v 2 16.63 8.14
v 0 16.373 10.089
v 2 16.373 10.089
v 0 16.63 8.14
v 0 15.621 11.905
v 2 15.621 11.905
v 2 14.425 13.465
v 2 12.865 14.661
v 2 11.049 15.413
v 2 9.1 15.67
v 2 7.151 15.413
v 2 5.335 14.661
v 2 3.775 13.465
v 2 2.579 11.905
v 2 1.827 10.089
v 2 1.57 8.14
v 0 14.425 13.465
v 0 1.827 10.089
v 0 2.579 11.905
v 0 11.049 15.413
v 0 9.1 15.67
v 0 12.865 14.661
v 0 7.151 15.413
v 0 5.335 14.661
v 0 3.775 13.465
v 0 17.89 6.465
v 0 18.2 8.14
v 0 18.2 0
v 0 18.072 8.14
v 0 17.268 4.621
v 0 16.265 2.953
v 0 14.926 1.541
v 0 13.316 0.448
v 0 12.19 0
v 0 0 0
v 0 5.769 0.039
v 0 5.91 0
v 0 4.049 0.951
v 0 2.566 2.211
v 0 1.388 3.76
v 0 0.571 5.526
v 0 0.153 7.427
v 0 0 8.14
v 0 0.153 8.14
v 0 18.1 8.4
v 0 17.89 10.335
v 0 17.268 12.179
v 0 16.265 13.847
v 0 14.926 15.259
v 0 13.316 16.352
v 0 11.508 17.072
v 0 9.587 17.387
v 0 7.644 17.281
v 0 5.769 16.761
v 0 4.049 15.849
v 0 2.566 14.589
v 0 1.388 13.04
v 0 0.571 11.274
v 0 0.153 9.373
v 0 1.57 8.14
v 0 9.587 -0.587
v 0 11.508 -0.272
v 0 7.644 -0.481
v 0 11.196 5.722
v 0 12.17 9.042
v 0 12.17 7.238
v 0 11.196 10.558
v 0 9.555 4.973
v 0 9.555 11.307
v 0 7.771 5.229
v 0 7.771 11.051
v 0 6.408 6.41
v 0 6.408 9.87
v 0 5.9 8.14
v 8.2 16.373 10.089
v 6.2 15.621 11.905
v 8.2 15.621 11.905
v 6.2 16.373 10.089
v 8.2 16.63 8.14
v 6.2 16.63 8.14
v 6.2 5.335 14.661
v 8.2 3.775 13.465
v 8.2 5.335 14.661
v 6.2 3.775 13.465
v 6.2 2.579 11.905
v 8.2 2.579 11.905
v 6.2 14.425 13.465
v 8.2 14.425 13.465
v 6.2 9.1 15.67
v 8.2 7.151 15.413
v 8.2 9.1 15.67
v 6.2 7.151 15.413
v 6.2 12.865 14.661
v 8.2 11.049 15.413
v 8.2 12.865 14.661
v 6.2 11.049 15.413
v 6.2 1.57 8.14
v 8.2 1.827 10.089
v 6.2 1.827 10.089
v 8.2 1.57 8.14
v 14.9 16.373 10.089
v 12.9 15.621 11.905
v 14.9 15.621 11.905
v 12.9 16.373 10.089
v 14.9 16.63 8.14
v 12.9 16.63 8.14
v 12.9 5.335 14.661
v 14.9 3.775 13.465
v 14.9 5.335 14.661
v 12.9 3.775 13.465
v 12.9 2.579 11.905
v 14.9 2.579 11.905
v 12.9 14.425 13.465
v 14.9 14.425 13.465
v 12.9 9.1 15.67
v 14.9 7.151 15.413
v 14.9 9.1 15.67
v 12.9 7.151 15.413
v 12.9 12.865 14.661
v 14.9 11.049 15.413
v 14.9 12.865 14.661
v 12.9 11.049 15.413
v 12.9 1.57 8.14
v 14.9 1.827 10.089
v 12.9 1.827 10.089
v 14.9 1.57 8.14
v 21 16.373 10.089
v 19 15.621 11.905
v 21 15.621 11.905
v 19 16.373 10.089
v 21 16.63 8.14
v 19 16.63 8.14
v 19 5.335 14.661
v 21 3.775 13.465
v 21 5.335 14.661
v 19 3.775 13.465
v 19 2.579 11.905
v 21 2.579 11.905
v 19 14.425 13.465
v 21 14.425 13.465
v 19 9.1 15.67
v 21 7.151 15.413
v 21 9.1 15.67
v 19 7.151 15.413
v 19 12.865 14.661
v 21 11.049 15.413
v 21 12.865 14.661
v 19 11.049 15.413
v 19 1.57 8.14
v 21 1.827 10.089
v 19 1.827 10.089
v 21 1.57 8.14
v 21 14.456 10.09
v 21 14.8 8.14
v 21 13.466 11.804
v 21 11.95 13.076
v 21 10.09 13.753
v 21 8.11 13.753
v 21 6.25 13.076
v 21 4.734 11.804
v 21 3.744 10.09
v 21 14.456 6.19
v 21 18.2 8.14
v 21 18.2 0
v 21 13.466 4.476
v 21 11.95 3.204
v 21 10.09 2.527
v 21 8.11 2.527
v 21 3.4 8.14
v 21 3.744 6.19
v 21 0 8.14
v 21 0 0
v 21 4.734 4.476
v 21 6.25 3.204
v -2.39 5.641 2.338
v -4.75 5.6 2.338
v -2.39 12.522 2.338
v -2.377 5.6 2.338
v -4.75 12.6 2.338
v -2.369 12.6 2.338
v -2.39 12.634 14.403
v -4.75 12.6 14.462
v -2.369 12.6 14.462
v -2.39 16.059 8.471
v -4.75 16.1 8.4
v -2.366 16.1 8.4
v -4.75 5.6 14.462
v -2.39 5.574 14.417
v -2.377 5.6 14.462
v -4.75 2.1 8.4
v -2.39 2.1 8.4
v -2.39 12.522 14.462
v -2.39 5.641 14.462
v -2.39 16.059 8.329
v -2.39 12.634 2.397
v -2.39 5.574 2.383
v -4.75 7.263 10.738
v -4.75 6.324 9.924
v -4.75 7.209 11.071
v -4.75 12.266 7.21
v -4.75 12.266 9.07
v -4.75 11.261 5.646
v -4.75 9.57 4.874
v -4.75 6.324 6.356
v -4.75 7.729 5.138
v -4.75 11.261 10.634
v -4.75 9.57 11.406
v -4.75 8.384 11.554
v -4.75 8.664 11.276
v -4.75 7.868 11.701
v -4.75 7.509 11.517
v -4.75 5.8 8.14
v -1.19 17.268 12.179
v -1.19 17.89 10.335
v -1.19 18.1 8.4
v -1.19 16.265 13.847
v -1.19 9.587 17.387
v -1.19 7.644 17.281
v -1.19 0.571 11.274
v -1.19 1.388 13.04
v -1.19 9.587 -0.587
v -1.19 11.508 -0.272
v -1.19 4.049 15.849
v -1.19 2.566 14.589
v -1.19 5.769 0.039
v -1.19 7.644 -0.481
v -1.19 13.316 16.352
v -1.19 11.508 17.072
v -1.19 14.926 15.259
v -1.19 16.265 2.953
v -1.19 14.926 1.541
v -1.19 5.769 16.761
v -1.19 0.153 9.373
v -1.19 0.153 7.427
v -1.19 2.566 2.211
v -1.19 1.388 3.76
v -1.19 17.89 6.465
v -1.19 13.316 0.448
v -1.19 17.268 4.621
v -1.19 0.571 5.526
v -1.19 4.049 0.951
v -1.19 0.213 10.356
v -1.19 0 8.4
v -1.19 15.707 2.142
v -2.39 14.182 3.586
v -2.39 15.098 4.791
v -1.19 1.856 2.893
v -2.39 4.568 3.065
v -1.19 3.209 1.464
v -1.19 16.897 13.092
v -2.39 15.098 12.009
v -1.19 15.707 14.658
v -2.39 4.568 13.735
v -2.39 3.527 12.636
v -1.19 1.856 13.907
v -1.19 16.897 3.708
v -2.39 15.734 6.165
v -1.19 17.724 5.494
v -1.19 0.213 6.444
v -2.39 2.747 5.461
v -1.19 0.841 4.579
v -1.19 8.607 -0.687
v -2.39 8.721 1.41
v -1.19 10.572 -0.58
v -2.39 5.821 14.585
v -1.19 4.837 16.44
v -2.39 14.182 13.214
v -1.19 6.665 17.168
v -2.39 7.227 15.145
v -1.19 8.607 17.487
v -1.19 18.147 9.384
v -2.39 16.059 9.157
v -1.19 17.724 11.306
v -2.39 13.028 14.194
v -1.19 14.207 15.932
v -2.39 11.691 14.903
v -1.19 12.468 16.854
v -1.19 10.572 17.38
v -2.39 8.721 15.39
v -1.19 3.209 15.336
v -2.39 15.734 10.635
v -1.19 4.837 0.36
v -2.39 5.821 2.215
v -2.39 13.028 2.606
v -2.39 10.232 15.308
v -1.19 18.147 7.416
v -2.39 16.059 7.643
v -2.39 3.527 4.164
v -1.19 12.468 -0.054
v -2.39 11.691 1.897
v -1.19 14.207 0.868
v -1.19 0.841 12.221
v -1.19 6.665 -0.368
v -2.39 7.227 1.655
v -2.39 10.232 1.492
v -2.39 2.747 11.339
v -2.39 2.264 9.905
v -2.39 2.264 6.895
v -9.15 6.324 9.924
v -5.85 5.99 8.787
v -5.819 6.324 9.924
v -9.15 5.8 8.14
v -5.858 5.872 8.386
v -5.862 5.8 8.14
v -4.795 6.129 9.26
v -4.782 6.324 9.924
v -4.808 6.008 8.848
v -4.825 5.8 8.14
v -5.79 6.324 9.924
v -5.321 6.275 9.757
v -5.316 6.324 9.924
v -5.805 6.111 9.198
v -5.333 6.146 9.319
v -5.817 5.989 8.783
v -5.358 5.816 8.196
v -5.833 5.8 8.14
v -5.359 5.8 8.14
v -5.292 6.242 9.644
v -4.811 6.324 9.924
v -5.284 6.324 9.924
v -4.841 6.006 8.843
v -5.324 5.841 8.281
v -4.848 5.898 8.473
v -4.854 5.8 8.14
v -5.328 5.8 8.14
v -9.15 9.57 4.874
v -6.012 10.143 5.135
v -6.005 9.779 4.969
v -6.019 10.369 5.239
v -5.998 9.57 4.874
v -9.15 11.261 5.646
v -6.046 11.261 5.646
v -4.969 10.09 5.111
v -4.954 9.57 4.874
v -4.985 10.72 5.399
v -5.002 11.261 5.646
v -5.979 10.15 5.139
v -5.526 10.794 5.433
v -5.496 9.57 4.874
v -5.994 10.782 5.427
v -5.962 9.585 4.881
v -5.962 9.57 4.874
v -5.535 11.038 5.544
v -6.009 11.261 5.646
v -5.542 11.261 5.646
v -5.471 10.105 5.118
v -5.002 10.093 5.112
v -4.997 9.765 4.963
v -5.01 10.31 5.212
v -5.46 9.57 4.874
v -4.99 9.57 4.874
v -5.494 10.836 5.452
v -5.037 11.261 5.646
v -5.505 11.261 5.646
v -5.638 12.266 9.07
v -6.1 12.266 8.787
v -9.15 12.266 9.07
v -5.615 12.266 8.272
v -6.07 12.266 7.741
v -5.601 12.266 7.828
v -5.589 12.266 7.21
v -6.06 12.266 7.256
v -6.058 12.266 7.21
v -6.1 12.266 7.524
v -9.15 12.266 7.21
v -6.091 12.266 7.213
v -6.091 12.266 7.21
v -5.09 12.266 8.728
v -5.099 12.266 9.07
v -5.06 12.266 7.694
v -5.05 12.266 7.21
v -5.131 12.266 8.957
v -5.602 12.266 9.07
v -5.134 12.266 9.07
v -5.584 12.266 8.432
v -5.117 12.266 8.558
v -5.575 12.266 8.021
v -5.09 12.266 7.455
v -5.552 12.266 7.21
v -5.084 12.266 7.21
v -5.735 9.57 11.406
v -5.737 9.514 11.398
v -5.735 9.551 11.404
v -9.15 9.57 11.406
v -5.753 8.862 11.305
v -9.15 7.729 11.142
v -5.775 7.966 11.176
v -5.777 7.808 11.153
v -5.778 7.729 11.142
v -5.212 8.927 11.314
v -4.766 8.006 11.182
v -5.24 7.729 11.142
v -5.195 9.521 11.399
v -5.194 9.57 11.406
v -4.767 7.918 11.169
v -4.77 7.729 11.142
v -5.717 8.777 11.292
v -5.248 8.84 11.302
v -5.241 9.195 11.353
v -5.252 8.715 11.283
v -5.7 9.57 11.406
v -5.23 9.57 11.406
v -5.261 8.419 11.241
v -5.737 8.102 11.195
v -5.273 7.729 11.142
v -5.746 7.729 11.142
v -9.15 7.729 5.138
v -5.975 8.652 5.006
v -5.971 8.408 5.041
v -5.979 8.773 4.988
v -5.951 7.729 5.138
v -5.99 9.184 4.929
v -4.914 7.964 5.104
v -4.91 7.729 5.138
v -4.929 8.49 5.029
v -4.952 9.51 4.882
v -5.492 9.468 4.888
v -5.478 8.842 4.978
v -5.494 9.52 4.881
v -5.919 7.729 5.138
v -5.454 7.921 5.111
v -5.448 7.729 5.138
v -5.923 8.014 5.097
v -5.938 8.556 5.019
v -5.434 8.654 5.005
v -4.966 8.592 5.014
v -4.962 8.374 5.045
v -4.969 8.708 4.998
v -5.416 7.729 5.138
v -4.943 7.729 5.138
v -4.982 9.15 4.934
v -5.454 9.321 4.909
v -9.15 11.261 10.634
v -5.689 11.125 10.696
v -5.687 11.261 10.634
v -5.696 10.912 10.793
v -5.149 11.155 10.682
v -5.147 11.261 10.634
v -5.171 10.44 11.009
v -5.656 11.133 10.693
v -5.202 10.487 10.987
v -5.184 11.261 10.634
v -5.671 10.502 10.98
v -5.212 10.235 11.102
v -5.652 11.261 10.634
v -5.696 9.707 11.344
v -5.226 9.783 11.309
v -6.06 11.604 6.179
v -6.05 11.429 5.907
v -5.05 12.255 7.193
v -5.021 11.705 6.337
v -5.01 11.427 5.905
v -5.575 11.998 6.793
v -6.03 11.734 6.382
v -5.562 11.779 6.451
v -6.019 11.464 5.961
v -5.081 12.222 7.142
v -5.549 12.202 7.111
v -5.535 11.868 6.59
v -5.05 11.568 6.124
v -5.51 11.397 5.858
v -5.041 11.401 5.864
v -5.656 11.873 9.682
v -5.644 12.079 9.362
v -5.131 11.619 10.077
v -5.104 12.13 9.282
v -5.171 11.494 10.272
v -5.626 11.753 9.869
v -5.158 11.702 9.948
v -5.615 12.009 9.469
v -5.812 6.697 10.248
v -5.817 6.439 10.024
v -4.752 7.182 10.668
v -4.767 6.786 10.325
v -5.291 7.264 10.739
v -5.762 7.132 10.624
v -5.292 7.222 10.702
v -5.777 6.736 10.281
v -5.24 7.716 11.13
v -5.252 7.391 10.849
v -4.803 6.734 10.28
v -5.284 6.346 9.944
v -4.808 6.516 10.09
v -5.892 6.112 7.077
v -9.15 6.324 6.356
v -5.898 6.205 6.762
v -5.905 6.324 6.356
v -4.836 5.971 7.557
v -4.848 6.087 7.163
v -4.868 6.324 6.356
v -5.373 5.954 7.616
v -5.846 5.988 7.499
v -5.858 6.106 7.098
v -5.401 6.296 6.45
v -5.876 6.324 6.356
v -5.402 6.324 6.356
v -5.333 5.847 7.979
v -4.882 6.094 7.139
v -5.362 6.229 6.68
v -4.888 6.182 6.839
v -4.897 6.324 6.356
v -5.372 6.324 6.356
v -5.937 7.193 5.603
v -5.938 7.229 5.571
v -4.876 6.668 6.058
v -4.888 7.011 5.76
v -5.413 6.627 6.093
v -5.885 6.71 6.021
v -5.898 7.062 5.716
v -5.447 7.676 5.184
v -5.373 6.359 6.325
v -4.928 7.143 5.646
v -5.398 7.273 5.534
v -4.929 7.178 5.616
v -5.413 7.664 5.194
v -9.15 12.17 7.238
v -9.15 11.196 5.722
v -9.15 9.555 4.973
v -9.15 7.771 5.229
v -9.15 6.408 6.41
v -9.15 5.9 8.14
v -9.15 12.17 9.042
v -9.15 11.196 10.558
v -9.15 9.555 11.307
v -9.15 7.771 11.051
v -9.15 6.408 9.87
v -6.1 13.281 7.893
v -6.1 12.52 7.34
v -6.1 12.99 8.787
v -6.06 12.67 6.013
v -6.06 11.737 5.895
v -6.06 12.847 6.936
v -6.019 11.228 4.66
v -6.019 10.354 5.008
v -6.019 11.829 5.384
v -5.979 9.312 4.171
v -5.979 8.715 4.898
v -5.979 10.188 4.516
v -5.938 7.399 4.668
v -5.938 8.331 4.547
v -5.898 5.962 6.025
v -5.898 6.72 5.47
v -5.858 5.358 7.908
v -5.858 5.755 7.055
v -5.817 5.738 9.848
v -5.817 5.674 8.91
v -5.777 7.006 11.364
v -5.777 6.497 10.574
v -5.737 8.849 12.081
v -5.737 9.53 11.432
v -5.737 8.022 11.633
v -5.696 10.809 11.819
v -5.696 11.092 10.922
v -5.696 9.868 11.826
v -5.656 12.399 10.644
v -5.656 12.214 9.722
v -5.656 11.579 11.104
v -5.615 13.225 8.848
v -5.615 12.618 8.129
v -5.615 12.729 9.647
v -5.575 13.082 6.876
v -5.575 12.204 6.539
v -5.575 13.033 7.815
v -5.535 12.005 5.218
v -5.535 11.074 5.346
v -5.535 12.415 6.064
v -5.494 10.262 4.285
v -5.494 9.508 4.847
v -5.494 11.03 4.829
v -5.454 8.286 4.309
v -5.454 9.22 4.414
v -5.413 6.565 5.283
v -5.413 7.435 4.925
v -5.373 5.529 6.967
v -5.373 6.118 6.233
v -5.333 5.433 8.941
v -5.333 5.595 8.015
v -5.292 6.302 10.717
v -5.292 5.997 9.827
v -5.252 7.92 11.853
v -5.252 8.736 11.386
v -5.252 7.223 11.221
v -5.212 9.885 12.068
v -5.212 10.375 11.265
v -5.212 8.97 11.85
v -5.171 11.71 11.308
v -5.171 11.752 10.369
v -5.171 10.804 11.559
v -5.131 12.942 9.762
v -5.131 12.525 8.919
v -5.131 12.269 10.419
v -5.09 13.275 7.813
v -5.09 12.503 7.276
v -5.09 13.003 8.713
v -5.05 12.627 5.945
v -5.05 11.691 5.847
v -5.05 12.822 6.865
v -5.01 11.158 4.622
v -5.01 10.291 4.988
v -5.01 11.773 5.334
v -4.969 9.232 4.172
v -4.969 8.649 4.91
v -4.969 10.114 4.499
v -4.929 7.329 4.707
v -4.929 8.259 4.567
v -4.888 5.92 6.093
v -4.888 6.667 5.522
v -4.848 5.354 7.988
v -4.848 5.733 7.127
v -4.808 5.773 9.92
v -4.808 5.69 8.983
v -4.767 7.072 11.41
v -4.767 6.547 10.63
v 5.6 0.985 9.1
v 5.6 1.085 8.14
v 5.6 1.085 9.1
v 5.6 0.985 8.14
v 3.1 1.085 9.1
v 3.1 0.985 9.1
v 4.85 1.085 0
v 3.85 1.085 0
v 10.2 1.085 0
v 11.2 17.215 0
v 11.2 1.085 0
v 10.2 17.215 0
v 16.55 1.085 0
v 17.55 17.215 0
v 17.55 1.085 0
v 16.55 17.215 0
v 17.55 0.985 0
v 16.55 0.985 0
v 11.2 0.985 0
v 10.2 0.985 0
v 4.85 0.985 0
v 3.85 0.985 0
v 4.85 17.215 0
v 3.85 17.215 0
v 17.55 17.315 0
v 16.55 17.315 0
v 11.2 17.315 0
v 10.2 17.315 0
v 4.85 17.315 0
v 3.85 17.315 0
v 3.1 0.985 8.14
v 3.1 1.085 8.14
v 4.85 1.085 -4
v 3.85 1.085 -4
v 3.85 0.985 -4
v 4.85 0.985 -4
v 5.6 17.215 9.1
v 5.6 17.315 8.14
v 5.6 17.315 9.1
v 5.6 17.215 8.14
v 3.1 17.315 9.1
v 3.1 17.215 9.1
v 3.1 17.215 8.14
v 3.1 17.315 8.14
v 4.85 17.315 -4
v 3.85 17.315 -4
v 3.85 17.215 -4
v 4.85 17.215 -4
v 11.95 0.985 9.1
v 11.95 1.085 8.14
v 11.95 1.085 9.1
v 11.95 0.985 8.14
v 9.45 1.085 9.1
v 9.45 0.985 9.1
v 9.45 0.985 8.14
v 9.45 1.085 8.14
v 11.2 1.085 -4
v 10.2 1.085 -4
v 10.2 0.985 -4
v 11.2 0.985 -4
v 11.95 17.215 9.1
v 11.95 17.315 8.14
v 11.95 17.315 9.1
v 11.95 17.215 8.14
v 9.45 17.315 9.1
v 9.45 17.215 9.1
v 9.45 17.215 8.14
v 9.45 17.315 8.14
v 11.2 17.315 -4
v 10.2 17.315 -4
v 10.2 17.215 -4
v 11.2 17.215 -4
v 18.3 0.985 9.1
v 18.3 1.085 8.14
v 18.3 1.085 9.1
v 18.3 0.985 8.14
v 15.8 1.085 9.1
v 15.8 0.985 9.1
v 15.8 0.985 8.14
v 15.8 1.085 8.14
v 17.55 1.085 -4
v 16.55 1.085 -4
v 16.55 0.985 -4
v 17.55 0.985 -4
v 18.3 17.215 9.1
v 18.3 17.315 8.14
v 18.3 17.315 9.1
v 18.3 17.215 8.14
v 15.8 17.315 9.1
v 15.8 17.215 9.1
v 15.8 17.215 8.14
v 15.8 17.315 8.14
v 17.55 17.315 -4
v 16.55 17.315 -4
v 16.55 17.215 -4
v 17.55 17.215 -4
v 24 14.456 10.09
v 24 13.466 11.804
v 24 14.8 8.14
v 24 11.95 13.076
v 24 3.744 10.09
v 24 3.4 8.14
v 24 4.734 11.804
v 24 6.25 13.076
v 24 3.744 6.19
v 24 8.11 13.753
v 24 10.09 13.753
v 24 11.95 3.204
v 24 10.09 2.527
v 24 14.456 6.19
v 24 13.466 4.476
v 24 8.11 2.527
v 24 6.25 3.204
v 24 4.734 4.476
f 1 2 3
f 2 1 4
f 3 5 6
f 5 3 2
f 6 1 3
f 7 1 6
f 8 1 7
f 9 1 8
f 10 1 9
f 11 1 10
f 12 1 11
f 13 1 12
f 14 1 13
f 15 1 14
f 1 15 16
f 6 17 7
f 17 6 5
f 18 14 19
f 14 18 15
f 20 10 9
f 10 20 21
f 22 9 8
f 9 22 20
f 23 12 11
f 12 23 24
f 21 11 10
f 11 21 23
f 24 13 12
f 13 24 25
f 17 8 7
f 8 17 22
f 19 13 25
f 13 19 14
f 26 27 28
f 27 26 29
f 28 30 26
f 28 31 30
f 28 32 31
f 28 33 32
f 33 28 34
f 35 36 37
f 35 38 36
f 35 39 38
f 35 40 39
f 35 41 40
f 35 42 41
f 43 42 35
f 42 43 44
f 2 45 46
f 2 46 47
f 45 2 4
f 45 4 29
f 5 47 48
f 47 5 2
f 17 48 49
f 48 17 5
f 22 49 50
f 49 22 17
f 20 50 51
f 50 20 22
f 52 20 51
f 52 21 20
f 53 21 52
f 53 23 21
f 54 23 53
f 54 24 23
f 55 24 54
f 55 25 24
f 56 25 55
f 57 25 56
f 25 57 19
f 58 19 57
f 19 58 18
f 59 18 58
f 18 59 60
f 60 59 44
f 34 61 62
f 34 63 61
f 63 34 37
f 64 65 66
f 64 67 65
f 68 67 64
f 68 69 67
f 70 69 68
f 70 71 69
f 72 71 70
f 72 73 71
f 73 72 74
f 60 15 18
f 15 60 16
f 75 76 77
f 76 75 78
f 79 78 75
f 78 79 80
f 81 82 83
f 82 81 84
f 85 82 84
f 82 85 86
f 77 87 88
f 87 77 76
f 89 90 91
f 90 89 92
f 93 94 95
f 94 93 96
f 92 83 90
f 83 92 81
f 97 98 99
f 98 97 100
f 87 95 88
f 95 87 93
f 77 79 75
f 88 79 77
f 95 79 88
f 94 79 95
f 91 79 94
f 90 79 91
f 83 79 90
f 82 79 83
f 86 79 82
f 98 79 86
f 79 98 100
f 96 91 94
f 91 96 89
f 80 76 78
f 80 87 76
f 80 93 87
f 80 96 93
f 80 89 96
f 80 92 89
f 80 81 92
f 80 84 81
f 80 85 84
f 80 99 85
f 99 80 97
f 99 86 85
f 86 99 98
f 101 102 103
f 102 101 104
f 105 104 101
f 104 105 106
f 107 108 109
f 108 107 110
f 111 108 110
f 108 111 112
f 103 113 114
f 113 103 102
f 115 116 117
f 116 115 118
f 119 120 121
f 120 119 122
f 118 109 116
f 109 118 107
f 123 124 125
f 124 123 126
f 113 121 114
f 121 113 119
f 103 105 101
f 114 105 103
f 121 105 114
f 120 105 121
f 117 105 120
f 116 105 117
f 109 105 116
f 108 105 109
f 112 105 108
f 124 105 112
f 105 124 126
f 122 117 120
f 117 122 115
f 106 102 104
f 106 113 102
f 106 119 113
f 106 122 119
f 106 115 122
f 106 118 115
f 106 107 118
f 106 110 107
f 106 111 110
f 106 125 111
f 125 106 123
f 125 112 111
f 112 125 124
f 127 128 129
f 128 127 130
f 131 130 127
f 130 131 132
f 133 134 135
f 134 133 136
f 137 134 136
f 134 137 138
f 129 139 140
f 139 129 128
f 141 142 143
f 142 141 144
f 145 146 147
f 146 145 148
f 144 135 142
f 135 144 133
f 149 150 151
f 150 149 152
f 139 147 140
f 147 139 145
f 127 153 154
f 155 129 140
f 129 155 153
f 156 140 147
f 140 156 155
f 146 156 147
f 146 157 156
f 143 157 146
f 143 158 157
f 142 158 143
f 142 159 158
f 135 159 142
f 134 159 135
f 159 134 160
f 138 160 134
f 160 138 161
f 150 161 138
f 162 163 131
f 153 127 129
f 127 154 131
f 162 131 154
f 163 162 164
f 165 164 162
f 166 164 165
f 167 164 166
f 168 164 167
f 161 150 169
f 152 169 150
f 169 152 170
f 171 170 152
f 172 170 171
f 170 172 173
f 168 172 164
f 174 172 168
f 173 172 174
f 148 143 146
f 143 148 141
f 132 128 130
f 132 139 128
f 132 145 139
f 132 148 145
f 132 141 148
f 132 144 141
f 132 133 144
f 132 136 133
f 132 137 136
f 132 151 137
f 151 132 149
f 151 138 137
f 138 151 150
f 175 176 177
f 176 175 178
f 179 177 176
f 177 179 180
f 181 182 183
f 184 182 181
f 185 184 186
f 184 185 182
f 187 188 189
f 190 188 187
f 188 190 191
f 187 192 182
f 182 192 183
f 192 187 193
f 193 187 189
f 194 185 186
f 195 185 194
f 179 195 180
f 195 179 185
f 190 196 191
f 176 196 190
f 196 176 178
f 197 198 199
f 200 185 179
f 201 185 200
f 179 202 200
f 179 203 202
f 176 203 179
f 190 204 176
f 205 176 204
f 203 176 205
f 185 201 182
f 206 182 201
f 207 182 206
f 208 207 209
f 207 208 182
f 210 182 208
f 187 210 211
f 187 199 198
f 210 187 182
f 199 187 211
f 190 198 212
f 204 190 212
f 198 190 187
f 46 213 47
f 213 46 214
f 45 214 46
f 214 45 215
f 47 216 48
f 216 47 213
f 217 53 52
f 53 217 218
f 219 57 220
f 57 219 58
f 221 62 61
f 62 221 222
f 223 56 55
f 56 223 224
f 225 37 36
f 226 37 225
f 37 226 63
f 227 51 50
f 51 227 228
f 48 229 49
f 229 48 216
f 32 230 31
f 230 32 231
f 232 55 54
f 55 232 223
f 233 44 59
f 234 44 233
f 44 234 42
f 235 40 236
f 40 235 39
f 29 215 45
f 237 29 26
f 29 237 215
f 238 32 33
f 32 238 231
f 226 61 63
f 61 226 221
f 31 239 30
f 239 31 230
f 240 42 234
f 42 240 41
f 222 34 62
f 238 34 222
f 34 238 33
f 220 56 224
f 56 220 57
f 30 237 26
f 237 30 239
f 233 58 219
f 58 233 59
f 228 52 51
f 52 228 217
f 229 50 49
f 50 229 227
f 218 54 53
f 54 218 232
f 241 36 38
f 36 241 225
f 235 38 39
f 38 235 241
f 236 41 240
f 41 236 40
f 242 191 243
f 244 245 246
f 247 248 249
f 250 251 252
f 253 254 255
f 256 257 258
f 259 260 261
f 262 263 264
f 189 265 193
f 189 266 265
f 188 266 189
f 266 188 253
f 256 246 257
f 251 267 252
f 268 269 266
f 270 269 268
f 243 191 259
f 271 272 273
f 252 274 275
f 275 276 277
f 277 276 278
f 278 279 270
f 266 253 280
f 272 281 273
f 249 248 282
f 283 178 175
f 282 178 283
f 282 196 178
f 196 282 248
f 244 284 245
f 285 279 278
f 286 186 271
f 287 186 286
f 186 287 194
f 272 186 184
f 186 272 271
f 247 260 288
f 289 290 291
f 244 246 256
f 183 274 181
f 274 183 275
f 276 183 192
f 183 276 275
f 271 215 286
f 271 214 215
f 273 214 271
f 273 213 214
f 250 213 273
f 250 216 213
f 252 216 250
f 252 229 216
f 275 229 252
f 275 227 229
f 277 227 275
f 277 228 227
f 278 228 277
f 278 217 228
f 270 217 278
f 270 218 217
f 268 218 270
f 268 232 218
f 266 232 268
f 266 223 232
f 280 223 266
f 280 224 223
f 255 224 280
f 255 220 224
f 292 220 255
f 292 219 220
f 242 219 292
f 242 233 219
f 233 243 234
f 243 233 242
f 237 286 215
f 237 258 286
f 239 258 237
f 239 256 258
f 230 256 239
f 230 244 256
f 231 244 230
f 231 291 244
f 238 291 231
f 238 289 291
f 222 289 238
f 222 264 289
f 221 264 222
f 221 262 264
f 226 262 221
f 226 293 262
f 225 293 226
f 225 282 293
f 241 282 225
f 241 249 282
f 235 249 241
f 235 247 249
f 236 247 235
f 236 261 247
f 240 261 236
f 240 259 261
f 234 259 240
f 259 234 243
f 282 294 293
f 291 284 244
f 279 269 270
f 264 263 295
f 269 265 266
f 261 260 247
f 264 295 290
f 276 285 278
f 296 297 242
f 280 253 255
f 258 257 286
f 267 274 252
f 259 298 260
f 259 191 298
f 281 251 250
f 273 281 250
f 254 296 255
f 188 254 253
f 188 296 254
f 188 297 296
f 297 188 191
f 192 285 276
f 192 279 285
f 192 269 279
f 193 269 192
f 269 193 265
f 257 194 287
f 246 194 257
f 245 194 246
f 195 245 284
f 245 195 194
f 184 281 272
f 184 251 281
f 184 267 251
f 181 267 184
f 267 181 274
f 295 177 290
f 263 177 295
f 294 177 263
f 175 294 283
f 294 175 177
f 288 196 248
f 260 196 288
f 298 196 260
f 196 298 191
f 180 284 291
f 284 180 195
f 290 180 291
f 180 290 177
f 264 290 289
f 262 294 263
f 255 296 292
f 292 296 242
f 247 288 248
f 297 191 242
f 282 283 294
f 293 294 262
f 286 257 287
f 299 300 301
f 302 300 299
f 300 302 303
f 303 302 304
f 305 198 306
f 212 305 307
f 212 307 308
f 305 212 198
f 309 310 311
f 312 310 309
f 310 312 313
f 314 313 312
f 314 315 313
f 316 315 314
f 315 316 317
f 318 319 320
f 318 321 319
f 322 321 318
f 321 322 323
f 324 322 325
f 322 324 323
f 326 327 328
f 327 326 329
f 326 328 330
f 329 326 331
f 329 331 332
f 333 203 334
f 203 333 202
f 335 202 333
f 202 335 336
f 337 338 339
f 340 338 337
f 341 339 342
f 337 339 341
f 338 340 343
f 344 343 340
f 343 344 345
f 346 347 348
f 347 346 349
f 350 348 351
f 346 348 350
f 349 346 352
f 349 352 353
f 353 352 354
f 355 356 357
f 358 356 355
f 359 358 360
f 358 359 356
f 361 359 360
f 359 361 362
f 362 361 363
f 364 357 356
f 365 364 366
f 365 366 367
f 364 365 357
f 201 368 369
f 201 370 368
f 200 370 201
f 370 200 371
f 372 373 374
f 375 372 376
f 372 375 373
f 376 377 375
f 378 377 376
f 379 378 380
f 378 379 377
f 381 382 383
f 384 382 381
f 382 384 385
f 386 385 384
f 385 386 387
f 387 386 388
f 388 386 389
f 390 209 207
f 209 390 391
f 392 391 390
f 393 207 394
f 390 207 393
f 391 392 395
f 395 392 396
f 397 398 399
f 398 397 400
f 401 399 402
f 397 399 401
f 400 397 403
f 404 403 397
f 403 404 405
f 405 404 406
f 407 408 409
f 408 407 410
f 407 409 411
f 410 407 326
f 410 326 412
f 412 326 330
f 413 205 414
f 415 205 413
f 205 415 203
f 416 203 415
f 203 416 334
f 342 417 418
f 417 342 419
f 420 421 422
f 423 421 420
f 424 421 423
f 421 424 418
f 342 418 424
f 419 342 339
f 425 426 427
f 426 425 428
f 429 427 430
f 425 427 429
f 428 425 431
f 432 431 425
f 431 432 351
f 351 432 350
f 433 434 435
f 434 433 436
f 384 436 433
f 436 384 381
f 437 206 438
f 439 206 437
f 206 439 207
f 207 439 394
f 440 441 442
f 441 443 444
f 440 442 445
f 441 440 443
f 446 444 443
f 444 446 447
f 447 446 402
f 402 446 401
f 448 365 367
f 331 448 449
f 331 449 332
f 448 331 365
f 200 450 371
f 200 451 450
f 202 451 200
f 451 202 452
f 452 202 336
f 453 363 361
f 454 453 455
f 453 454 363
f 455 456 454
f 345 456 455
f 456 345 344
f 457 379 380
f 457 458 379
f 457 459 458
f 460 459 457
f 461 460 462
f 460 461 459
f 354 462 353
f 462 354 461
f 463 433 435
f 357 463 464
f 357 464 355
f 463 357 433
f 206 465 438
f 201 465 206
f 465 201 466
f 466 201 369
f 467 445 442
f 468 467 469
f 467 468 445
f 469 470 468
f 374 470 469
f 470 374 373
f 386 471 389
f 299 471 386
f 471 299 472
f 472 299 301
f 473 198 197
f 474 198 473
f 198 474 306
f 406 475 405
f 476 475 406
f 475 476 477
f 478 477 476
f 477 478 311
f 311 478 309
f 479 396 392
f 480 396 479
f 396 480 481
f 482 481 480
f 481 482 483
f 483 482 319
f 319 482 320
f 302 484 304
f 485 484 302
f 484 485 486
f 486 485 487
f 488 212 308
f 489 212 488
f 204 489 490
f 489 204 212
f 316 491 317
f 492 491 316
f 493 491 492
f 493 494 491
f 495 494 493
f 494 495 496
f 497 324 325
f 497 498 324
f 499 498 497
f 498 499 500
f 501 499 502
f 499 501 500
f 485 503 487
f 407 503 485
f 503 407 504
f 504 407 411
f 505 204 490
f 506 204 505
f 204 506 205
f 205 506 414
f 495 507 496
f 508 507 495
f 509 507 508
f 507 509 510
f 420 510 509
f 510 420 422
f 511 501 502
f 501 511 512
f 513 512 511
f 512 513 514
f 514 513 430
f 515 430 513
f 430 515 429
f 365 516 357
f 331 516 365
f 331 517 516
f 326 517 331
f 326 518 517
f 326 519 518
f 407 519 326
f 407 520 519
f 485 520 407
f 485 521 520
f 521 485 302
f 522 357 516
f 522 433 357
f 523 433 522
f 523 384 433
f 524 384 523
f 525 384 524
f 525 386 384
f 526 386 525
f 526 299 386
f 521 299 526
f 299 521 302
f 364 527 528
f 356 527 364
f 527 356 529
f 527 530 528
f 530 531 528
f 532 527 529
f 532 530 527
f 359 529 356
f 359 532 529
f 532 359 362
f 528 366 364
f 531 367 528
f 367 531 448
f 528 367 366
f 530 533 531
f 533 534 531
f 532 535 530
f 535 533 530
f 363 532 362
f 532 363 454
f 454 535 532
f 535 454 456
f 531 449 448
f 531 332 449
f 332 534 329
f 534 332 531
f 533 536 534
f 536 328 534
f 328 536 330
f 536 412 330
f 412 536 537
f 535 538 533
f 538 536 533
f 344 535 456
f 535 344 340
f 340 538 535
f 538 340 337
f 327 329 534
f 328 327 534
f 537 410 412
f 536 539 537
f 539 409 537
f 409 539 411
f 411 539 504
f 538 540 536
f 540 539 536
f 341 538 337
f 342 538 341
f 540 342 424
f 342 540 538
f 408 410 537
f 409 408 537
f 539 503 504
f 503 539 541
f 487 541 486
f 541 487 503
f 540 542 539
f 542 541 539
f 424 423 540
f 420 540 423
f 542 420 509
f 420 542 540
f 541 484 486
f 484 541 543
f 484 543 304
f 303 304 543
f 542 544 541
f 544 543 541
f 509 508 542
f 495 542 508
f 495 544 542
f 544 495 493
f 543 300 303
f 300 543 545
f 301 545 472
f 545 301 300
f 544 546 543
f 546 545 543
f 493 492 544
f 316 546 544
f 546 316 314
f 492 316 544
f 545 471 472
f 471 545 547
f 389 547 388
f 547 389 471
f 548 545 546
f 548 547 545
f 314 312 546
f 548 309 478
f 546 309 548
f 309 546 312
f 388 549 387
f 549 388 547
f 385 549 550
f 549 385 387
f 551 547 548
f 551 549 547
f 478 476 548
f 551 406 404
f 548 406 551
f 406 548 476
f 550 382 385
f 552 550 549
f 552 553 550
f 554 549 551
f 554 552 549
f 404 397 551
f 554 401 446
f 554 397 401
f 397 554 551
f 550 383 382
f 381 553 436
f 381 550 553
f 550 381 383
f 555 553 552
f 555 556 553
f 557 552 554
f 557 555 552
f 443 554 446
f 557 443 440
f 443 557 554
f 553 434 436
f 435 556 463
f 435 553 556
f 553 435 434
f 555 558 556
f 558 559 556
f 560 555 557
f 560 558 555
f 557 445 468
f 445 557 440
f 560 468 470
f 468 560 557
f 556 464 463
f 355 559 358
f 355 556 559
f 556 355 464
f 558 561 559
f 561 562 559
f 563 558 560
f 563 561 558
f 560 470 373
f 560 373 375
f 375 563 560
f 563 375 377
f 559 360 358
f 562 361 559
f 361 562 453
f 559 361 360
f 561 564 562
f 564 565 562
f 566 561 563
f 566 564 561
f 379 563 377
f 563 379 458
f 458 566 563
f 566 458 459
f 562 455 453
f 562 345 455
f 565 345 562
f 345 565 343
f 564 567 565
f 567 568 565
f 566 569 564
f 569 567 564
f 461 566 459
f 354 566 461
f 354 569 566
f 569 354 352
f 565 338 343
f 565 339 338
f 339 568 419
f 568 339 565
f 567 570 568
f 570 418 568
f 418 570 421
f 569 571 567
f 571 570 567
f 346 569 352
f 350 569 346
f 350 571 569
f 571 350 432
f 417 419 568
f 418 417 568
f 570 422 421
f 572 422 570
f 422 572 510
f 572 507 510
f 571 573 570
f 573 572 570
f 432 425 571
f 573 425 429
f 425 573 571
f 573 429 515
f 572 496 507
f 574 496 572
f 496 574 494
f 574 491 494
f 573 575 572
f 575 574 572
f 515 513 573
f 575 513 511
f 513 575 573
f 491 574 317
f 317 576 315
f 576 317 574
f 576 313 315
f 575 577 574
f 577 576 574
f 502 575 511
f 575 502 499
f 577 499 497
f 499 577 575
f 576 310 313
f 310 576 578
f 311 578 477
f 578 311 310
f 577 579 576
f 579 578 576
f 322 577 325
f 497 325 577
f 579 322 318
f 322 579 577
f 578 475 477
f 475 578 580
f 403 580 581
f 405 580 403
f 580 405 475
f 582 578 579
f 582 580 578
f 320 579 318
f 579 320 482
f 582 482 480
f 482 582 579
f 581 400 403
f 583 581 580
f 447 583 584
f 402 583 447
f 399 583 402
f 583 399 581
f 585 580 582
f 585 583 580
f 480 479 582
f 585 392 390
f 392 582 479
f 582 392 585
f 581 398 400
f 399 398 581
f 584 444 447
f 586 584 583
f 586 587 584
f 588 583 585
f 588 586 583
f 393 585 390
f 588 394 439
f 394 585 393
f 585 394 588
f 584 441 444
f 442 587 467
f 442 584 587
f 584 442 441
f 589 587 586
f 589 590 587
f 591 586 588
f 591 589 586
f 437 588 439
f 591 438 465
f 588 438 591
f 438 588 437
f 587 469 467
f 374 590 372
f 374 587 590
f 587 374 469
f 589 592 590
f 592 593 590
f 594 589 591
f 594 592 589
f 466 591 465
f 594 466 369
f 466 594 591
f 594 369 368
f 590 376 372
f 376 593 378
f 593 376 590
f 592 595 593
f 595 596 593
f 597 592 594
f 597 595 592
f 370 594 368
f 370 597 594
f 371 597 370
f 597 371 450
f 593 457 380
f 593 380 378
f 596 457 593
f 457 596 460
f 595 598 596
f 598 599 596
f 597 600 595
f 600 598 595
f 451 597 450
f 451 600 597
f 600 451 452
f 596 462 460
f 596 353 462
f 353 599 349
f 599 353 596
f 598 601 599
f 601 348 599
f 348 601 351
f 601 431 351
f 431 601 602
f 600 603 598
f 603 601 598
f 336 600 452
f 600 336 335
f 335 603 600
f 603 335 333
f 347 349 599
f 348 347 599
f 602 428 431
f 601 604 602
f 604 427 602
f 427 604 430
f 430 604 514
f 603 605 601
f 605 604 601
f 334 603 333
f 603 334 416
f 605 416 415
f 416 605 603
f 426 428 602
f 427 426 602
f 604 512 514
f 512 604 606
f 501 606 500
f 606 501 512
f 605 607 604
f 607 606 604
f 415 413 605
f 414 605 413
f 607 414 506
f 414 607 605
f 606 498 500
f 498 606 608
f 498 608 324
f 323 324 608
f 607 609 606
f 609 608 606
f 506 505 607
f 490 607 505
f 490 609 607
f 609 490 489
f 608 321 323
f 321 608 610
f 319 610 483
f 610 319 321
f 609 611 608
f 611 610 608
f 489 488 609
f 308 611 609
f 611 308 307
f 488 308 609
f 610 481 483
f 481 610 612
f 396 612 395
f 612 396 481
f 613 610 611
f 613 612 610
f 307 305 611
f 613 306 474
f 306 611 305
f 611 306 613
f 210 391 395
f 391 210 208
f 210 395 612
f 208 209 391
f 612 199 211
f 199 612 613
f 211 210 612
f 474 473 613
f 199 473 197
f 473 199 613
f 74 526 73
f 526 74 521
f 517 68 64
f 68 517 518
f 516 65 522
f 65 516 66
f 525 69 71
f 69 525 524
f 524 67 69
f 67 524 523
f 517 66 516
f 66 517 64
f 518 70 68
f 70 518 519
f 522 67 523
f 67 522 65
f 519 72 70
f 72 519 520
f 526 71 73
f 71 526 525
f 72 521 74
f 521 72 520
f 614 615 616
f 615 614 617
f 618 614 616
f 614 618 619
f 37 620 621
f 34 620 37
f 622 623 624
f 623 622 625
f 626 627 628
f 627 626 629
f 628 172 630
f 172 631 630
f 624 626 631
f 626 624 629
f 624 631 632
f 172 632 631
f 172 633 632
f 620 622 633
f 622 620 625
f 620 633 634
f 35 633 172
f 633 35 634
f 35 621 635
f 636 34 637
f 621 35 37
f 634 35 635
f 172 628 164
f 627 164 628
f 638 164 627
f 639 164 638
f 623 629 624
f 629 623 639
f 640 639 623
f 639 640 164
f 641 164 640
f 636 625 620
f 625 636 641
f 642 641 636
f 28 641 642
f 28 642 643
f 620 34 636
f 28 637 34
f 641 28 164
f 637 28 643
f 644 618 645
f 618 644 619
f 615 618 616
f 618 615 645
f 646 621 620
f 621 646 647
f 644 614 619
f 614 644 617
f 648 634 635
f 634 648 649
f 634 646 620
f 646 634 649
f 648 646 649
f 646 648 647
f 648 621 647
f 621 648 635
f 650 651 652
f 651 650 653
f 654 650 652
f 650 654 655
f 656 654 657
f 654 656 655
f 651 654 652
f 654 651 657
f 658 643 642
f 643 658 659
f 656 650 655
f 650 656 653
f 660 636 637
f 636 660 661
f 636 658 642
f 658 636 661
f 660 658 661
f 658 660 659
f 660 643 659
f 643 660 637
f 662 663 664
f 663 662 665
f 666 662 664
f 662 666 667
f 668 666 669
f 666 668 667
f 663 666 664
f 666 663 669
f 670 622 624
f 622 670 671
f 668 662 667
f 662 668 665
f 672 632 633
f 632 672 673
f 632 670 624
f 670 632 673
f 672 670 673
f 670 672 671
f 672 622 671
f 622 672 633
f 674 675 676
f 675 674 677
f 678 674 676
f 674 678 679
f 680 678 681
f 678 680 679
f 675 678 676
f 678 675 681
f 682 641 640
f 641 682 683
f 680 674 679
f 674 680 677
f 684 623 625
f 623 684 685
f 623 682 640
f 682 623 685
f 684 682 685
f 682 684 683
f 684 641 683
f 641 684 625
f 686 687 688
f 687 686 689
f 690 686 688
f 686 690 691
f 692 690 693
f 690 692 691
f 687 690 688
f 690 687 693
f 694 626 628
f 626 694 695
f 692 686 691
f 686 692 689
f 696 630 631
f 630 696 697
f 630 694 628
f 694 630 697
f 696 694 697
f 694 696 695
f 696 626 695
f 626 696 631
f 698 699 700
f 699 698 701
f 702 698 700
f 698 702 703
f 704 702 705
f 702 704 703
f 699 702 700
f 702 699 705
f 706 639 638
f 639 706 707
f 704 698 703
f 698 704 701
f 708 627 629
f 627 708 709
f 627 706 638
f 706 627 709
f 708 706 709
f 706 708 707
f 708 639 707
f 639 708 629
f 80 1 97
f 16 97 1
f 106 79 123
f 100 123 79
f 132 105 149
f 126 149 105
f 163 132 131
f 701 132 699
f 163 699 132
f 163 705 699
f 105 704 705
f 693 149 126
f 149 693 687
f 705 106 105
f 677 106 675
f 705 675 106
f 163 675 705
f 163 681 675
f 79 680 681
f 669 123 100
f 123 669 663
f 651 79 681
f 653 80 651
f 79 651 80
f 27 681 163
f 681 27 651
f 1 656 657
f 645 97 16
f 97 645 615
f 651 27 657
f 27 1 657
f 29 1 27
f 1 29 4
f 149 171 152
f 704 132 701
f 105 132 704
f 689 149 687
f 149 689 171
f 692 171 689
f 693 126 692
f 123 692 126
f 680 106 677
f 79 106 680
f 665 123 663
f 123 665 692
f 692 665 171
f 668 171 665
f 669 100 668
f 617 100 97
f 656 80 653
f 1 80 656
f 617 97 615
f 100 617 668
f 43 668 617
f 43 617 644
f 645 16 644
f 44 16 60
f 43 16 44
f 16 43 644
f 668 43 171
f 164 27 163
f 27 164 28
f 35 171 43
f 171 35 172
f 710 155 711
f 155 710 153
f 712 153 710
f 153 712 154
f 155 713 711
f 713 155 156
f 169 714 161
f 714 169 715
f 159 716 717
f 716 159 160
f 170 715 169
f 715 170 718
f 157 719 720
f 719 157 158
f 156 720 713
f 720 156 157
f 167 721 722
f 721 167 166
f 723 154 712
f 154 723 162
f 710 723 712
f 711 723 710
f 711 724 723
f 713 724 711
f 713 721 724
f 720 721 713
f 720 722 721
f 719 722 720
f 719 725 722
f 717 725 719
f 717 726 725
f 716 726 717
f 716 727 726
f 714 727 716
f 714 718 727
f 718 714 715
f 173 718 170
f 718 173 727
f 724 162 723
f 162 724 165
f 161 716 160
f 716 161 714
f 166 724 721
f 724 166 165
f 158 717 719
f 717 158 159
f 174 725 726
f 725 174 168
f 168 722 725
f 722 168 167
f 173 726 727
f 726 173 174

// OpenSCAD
/* 2014 Don Bosley : 
Neutrik Jack Set V 0.0:
For updates/corrections email : don@bosleymusic.com
Mechanical Drawing
Compatible with Neutrik products : 
- stereo jack, switched, half threaded nose and straight PCB pins

NMJ6HHD2


*/

//MAIN BODY
translate([0,0,0])
color("black") 
cube([21,18.2,8.14]); 

//BODY SECTIONS
for (i = [ [0,9.1,8.14],
		   [6.2,9.1,8.14],
		   [12.9,9.1,8.14],
		   [19,9.1,8.14],
])
{
	color("black")
	translate(i)
	rotate([90,0,90])
	cylinder(r=15.67-8.14, h=2); 
}

//REAR CYLINDER
color("black")
translate([20.9,9.1,8.14])
rotate([90,0,90]) 
cylinder(r=5.7,h=3.1);


difference(){
	union(){
		//NUT
		color("lightgrey")
		translate([.25, 9.1,8.4])
		rotate([90,0,-90])
		cylinder(r=7,h=5, $fn=6); 
		
//FRONT WASHER
			color("black")
			translate([-1.2,9.1,8.4])
			rotate([90,0,90])
			cylinder(r=9, h=1.2); 

//FRONT BEVEL / NUT
		color("black")
		translate([-1.19, 9.1,8.4])
		rotate([90,0,-90])
		cylinder(r2=7, r1=9.1,h=1.2);
//MAIN SHAFT 
		color("black")
		translate([-.15, 9.1,8.14])
		rotate([90,0,-90])
		cylinder(r=3.3,h=9); 
//FRONT SCREW THREAD
		color("black")
		translate([-4, 15.75-6.43, 8.14])
		rotate([0,90,0])
		linear_extrude(height = 4.2, center = true, convexity = 10, twist = 3000)
		translate([0, 3.2, 1])
		circle(r = .8); 
	}
//NUTHOLE
color("black")
translate([8, 9.1,8.14])
rotate([90,0,-90])
cylinder(r=3.2,h=24); 
}


/*ENSURE PIN CENTERS ARE ALIGNED (COMMENT OUT)
for (i = [  [4,2.23/2,-2],//S
		   [4,18.2-2.23/2,-2],//SN
		   [16.7,2.23/2,-2],//T
		   [16.7,18.2-2.23/2,-2],//TN

 ])
{
	translate(i)
	color("blue")
	cylinder(r=.7, h=9);
}
*/
//PINS 
for(i = [
	     [4.35-1.25,.985,0],//S
		 [4.35-1.25,18.2-.985,0],//SN
		 [10.7-1.25,.985,0],//R
		 [10.7-1.25,18.2-.985,0],//RN
	     [17.05-1.25,.985,0],//T
		 [17.05-1.25,18.2-.985,0],//TN

])
{
	translate(i)
	color("lightgrey") 
	union(){
		cube([2.5,.1,9.1]);  
		translate([.75,0,-4])
		cube([1,.1,4]);
	}
}
